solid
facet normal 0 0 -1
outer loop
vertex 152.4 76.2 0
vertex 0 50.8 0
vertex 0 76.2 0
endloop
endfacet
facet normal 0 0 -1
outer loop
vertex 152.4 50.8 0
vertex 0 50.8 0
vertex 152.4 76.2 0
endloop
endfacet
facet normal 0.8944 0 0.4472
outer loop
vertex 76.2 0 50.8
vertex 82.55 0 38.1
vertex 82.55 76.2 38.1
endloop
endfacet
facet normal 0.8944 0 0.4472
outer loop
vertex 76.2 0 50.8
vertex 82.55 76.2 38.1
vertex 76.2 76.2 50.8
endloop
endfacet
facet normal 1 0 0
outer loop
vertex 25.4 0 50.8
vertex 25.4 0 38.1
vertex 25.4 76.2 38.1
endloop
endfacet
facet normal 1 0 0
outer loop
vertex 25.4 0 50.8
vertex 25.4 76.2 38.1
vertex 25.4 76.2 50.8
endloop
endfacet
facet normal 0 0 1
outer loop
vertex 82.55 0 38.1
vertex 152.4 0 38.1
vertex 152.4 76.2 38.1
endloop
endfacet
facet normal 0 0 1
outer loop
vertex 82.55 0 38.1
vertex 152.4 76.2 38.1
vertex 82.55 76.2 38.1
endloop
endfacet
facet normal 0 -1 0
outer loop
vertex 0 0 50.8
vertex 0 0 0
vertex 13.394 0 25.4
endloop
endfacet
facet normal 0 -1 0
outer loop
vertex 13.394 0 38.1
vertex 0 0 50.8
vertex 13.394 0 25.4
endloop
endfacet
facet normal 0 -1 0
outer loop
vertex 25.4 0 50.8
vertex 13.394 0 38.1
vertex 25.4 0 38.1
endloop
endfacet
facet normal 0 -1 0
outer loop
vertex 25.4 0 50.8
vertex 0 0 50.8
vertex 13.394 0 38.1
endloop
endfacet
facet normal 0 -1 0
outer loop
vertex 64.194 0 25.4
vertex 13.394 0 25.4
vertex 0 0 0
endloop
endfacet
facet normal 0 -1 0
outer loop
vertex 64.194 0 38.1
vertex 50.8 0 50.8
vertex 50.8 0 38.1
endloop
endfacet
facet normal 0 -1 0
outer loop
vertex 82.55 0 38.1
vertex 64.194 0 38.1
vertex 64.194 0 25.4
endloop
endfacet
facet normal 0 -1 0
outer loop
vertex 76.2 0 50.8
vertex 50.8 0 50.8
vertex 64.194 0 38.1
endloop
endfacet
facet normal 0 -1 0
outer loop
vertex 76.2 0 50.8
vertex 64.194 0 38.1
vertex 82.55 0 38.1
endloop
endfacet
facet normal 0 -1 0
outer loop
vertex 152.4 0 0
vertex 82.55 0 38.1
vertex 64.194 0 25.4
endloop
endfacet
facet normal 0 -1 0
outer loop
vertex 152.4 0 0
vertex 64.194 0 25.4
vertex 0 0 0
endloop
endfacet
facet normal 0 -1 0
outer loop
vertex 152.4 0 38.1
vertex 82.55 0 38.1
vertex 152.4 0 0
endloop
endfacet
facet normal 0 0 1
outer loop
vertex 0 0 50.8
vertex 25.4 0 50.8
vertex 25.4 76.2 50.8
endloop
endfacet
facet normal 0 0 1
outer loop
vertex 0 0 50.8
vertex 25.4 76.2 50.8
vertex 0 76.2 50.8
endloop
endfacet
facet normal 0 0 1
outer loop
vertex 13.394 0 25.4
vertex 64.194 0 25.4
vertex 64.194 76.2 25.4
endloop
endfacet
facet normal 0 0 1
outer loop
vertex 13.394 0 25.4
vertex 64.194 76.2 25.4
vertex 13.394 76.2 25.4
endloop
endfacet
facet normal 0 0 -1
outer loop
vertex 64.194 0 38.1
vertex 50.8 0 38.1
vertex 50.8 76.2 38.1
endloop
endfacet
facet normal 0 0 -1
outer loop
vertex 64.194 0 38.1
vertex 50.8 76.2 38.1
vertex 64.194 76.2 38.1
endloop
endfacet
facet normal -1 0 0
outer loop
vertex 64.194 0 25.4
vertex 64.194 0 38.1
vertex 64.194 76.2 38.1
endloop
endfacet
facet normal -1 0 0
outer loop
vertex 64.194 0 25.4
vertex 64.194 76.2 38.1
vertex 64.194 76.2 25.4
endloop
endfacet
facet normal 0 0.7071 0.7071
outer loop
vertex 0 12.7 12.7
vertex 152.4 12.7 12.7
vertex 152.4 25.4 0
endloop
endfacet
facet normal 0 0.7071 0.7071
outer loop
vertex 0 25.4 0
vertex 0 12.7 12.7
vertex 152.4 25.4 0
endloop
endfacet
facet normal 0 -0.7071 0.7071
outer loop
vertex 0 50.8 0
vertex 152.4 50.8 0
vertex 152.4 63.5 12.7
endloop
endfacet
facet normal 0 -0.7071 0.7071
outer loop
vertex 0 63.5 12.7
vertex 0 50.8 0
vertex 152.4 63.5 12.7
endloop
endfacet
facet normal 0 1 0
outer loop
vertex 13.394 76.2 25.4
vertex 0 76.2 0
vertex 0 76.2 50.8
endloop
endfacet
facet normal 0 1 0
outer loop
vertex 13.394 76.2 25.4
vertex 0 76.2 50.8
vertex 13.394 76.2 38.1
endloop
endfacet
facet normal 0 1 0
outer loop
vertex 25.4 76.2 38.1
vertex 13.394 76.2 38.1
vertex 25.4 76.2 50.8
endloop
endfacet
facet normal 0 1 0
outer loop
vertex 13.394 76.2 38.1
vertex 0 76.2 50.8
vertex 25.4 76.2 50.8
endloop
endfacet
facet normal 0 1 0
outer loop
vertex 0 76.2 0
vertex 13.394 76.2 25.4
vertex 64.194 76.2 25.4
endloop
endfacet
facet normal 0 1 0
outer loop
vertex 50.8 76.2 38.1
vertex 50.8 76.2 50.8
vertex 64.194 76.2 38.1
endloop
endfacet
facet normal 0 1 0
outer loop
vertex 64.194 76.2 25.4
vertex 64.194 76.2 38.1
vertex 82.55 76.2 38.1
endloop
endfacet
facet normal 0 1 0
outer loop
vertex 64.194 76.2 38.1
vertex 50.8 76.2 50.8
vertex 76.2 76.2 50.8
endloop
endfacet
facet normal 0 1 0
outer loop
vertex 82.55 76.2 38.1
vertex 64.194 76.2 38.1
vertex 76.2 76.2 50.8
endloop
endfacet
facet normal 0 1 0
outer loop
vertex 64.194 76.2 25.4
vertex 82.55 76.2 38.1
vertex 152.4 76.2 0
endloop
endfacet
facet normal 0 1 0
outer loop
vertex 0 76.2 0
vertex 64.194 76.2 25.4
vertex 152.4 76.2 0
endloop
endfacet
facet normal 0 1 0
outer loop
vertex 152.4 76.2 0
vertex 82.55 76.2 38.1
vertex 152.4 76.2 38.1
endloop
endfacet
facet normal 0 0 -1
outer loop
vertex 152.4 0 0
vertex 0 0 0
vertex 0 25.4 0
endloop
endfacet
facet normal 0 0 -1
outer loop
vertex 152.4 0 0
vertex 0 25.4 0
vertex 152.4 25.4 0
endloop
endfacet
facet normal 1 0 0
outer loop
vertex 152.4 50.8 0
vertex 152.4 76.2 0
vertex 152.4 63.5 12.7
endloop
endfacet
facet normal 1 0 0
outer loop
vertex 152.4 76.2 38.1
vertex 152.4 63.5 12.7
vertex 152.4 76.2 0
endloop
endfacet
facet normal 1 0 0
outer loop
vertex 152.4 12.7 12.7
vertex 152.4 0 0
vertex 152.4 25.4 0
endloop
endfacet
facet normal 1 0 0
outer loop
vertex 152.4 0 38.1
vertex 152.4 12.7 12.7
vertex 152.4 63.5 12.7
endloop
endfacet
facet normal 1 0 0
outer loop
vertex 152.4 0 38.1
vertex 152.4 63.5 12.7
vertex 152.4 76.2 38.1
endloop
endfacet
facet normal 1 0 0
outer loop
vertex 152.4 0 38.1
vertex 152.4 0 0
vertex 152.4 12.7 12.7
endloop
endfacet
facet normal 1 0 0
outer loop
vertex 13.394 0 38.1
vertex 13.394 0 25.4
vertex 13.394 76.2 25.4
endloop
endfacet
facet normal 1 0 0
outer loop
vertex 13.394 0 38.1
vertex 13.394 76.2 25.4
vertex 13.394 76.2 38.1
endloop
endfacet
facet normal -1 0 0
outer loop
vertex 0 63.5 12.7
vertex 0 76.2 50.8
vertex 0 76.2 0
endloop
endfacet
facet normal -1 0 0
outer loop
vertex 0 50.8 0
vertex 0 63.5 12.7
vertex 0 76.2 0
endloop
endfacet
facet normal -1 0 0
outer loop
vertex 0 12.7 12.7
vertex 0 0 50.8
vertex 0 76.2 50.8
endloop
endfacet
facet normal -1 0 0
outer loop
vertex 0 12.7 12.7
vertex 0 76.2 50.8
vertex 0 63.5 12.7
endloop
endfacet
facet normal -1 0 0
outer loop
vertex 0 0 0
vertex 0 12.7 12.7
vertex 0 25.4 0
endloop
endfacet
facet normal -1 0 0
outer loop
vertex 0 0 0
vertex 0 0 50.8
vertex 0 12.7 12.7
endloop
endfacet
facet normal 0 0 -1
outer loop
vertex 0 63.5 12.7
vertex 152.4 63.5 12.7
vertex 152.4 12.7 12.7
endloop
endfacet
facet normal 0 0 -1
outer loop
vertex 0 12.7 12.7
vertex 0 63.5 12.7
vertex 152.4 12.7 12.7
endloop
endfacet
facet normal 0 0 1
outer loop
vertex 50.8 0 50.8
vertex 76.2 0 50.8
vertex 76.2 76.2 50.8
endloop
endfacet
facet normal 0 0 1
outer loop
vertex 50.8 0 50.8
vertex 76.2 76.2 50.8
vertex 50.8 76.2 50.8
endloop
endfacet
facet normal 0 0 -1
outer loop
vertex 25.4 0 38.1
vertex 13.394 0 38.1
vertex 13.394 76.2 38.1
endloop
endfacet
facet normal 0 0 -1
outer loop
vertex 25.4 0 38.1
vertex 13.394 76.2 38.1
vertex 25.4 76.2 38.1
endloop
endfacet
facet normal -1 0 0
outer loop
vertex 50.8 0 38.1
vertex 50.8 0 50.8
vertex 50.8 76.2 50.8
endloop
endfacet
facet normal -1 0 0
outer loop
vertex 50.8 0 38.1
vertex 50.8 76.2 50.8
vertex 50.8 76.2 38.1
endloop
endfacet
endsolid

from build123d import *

# Parameters (mm, degrees)
F1_DEPTH = 76.2
F3_DEPTH = 152.4


with BuildPart() as f1:
    # F0 (on Front) → F1 (new body)
    with BuildSketch(Plane.XZ):
        Polygon((0, 50.8), (0, 0), (152.4, 0), (152.4, 38.1), (82.55, 38.1), (76.2, 50.8), (50.8, 50.8), (50.8, 38.1), (64.193791, 38.1), (64.193791, 25.4), (13.393791, 25.4), (13.393791, 38.1), (25.4, 38.1), (25.4, 50.8), align=None)
    extrude(amount=-F1_DEPTH)

    # F2 (on face) → F3 (cut)
    with BuildSketch(Plane.YZ.offset(152.4)):
        Polygon((12.7, 12.7), (25.4, 0), (50.8, 0), (63.5, 12.7), align=None)
    extrude(amount=-F3_DEPTH, mode=Mode.SUBTRACT)


solid = f1.part
